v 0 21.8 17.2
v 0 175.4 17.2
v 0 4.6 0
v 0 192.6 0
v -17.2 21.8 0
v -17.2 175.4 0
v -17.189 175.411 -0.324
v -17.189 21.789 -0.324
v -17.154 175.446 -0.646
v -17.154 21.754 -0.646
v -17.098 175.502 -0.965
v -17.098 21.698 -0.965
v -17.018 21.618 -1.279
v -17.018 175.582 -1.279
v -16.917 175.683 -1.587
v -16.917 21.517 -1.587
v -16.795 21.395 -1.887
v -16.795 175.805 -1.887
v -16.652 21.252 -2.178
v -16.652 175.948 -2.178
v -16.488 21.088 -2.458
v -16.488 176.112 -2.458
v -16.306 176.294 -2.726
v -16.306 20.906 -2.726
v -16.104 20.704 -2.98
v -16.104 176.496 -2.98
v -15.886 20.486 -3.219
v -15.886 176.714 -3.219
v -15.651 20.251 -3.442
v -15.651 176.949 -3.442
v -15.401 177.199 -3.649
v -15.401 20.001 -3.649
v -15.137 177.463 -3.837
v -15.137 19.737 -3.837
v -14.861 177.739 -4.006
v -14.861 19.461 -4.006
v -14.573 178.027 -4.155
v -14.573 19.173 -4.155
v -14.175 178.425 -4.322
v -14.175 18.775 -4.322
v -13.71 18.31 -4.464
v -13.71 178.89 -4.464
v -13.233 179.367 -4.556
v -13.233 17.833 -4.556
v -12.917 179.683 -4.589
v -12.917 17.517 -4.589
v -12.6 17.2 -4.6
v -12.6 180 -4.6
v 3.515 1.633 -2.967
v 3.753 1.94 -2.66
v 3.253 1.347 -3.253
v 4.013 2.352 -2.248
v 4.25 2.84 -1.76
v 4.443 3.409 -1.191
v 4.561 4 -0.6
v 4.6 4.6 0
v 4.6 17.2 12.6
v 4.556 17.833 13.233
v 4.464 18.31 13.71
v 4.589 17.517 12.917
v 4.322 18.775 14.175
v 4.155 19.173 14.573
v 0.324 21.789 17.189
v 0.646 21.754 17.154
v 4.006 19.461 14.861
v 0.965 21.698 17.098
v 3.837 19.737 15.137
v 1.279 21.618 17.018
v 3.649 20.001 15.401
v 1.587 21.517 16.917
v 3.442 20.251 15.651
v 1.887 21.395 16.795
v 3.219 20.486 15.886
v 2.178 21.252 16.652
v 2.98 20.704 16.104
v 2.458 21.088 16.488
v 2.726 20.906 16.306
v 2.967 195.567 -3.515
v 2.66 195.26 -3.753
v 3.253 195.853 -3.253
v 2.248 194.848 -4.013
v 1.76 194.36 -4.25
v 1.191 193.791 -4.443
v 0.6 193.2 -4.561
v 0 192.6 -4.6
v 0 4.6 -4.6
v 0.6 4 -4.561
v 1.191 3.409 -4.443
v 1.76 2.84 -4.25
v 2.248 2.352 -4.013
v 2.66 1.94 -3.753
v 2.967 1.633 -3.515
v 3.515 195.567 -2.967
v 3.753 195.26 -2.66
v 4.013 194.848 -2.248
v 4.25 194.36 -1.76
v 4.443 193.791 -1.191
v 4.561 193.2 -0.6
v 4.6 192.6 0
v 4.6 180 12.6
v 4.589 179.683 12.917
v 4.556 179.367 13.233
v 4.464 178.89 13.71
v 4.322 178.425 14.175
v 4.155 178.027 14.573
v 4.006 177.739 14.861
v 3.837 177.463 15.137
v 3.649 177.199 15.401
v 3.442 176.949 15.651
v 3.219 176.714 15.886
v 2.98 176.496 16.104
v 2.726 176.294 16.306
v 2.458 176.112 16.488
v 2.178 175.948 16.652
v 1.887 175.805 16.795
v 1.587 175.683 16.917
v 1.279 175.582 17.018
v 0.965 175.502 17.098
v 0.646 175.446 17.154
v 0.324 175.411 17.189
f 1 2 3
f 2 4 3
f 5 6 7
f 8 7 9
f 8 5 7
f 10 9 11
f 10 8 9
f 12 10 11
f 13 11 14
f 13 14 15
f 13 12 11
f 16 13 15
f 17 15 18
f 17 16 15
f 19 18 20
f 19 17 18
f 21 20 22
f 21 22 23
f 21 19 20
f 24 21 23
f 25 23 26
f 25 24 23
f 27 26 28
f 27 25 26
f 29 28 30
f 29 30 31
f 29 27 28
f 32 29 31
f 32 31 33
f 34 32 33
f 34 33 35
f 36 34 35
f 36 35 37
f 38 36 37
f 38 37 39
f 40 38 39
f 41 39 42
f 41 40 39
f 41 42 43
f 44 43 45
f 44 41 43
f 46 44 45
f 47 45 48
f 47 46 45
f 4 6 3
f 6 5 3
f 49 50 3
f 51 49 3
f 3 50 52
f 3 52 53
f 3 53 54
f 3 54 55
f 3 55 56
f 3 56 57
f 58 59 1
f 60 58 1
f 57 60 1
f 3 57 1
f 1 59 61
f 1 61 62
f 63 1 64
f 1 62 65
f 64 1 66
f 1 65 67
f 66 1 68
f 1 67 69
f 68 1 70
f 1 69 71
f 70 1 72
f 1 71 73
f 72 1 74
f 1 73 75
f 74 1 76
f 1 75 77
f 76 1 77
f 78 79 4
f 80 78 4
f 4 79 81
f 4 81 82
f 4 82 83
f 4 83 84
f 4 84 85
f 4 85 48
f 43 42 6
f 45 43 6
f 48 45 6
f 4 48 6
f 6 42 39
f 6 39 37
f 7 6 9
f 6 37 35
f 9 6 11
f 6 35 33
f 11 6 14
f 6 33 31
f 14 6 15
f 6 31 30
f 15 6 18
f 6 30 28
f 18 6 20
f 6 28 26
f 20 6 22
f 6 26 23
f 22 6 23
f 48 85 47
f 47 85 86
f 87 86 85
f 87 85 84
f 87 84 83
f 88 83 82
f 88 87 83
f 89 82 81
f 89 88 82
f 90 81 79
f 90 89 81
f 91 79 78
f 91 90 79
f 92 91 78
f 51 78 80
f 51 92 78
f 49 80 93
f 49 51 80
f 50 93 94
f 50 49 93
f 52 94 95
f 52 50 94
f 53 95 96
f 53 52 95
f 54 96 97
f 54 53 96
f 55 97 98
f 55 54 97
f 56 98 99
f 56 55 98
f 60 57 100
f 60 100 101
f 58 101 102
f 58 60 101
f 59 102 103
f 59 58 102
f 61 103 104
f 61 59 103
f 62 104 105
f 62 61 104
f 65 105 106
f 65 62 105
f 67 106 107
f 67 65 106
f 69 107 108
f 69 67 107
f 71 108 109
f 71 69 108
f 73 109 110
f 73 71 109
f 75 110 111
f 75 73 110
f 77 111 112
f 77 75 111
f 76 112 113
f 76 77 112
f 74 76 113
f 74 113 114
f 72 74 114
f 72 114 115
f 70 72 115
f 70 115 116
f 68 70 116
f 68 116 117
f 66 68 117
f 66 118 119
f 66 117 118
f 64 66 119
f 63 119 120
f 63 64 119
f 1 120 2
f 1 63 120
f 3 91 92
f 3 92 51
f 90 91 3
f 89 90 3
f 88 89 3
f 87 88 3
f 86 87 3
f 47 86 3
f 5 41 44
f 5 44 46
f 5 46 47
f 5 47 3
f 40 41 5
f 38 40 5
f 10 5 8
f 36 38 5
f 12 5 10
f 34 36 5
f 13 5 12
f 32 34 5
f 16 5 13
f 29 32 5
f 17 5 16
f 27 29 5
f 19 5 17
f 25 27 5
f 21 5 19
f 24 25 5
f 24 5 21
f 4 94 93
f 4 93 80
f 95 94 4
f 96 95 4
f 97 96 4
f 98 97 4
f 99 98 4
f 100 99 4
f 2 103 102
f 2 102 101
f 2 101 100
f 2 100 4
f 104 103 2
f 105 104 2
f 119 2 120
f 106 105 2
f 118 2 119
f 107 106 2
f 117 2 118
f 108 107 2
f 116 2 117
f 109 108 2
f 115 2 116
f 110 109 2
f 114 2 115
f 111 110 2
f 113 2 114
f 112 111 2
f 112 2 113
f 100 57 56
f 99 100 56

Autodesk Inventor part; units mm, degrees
ref_plane "YZ Plane" through (0, 0, 0) normal (1, 0, 0) x (0, 1, 0)
ref_plane "XZ Plane" through (0, 0, 0) normal (0, 1, 0) x (-1, 0, 0)
ref_plane "XY Plane" through (0, 0, 0) normal (0, 0, 1) x (1, 0, 0)
sketch "Skizze1" plane through (0, 0, 0) normal (0, 1, 0) x (-1, 0, 0)
  line L0 (-4.6, 12.6) -> (-4.6, 0)
  arc A0 (-4.6, 0) -> (0, -4.6) centre (0, 0) ccw
  line L1 (0, -4.6) -> (12.6, -4.6)
  arc A1 (12.6, -4.6) -> (17.2, 0) centre (12.6, 0) ccw
  line L2 (17.2, 0) -> (0, 0)
  line L3 (0, 0) -> (0, 17.2)
  arc A2 (0, 17.2) -> (-4.6, 12.6) centre (0, 12.6) ccw
  point P0 (0, 0)
  dimension "d0" = 4.6
  dimension "d1" = 21.8
extrude "Extrusion1" add sketch "Skizze1" along normal blind 197.2
sketch "Skizze2" plane through (0, 0, -4.6) normal (0, 0, -1) x (-1, 0, 0)
  line L0 (-4.6, 0) -> (17.2, 21.8)
  line L1 (17.2, 0) -> (17.2, 197.2) projected
  line L2 (17.2, 0) -> (12.6, 0) projected
  line L3 (17.2, 21.8) -> (17.2, 0)
  line L4 (17.2, 0) -> (-4.6, 0)
  line L5 (17.2, 197.2) -> (-4.6, 197.2)
  line L6 (-4.6, 197.2) -> (17.2, 175.4)
  line L7 (17.2, 197.2) -> (17.2, 175.4)
  point P0 (0, 0)
  dimension "d4" = 45
  dimension "d7" = 45
extrude "Extrusion2" cut sketch "Skizze2" against normal through all
sketch "Skizze3" plane through (4.6, 0, 0) normal (1, 0, 0) x (0, 0, -1)
  line L0 (4.6, 0) -> (-17.2, 21.8)
  line L1 (-17.2, 4.6) -> (-17.2, 192.6) projected
  line L2 (-17.2, 21.8) -> (-17.2, 0)
  line L3 (-17.2, 0) -> (4.6, 0)
  line L4 (-17.2, 175.4) -> (-17.2, 197.2)
  line L5 (-17.2, 197.2) -> (4.6, 197.2)
  line L6 (4.6, 197.2) -> (-17.2, 175.4)
  point P0 (0, 0)
  point P1 (4.6, 4.6)
  point P2 (-12.6, 197.2)
  dimension "d8" = 45
  dimension "d9" = 45
extrude "Extrusion3" cut sketch "Skizze3" against normal through all
properties part number "winkelTop" material "Kiefer"
